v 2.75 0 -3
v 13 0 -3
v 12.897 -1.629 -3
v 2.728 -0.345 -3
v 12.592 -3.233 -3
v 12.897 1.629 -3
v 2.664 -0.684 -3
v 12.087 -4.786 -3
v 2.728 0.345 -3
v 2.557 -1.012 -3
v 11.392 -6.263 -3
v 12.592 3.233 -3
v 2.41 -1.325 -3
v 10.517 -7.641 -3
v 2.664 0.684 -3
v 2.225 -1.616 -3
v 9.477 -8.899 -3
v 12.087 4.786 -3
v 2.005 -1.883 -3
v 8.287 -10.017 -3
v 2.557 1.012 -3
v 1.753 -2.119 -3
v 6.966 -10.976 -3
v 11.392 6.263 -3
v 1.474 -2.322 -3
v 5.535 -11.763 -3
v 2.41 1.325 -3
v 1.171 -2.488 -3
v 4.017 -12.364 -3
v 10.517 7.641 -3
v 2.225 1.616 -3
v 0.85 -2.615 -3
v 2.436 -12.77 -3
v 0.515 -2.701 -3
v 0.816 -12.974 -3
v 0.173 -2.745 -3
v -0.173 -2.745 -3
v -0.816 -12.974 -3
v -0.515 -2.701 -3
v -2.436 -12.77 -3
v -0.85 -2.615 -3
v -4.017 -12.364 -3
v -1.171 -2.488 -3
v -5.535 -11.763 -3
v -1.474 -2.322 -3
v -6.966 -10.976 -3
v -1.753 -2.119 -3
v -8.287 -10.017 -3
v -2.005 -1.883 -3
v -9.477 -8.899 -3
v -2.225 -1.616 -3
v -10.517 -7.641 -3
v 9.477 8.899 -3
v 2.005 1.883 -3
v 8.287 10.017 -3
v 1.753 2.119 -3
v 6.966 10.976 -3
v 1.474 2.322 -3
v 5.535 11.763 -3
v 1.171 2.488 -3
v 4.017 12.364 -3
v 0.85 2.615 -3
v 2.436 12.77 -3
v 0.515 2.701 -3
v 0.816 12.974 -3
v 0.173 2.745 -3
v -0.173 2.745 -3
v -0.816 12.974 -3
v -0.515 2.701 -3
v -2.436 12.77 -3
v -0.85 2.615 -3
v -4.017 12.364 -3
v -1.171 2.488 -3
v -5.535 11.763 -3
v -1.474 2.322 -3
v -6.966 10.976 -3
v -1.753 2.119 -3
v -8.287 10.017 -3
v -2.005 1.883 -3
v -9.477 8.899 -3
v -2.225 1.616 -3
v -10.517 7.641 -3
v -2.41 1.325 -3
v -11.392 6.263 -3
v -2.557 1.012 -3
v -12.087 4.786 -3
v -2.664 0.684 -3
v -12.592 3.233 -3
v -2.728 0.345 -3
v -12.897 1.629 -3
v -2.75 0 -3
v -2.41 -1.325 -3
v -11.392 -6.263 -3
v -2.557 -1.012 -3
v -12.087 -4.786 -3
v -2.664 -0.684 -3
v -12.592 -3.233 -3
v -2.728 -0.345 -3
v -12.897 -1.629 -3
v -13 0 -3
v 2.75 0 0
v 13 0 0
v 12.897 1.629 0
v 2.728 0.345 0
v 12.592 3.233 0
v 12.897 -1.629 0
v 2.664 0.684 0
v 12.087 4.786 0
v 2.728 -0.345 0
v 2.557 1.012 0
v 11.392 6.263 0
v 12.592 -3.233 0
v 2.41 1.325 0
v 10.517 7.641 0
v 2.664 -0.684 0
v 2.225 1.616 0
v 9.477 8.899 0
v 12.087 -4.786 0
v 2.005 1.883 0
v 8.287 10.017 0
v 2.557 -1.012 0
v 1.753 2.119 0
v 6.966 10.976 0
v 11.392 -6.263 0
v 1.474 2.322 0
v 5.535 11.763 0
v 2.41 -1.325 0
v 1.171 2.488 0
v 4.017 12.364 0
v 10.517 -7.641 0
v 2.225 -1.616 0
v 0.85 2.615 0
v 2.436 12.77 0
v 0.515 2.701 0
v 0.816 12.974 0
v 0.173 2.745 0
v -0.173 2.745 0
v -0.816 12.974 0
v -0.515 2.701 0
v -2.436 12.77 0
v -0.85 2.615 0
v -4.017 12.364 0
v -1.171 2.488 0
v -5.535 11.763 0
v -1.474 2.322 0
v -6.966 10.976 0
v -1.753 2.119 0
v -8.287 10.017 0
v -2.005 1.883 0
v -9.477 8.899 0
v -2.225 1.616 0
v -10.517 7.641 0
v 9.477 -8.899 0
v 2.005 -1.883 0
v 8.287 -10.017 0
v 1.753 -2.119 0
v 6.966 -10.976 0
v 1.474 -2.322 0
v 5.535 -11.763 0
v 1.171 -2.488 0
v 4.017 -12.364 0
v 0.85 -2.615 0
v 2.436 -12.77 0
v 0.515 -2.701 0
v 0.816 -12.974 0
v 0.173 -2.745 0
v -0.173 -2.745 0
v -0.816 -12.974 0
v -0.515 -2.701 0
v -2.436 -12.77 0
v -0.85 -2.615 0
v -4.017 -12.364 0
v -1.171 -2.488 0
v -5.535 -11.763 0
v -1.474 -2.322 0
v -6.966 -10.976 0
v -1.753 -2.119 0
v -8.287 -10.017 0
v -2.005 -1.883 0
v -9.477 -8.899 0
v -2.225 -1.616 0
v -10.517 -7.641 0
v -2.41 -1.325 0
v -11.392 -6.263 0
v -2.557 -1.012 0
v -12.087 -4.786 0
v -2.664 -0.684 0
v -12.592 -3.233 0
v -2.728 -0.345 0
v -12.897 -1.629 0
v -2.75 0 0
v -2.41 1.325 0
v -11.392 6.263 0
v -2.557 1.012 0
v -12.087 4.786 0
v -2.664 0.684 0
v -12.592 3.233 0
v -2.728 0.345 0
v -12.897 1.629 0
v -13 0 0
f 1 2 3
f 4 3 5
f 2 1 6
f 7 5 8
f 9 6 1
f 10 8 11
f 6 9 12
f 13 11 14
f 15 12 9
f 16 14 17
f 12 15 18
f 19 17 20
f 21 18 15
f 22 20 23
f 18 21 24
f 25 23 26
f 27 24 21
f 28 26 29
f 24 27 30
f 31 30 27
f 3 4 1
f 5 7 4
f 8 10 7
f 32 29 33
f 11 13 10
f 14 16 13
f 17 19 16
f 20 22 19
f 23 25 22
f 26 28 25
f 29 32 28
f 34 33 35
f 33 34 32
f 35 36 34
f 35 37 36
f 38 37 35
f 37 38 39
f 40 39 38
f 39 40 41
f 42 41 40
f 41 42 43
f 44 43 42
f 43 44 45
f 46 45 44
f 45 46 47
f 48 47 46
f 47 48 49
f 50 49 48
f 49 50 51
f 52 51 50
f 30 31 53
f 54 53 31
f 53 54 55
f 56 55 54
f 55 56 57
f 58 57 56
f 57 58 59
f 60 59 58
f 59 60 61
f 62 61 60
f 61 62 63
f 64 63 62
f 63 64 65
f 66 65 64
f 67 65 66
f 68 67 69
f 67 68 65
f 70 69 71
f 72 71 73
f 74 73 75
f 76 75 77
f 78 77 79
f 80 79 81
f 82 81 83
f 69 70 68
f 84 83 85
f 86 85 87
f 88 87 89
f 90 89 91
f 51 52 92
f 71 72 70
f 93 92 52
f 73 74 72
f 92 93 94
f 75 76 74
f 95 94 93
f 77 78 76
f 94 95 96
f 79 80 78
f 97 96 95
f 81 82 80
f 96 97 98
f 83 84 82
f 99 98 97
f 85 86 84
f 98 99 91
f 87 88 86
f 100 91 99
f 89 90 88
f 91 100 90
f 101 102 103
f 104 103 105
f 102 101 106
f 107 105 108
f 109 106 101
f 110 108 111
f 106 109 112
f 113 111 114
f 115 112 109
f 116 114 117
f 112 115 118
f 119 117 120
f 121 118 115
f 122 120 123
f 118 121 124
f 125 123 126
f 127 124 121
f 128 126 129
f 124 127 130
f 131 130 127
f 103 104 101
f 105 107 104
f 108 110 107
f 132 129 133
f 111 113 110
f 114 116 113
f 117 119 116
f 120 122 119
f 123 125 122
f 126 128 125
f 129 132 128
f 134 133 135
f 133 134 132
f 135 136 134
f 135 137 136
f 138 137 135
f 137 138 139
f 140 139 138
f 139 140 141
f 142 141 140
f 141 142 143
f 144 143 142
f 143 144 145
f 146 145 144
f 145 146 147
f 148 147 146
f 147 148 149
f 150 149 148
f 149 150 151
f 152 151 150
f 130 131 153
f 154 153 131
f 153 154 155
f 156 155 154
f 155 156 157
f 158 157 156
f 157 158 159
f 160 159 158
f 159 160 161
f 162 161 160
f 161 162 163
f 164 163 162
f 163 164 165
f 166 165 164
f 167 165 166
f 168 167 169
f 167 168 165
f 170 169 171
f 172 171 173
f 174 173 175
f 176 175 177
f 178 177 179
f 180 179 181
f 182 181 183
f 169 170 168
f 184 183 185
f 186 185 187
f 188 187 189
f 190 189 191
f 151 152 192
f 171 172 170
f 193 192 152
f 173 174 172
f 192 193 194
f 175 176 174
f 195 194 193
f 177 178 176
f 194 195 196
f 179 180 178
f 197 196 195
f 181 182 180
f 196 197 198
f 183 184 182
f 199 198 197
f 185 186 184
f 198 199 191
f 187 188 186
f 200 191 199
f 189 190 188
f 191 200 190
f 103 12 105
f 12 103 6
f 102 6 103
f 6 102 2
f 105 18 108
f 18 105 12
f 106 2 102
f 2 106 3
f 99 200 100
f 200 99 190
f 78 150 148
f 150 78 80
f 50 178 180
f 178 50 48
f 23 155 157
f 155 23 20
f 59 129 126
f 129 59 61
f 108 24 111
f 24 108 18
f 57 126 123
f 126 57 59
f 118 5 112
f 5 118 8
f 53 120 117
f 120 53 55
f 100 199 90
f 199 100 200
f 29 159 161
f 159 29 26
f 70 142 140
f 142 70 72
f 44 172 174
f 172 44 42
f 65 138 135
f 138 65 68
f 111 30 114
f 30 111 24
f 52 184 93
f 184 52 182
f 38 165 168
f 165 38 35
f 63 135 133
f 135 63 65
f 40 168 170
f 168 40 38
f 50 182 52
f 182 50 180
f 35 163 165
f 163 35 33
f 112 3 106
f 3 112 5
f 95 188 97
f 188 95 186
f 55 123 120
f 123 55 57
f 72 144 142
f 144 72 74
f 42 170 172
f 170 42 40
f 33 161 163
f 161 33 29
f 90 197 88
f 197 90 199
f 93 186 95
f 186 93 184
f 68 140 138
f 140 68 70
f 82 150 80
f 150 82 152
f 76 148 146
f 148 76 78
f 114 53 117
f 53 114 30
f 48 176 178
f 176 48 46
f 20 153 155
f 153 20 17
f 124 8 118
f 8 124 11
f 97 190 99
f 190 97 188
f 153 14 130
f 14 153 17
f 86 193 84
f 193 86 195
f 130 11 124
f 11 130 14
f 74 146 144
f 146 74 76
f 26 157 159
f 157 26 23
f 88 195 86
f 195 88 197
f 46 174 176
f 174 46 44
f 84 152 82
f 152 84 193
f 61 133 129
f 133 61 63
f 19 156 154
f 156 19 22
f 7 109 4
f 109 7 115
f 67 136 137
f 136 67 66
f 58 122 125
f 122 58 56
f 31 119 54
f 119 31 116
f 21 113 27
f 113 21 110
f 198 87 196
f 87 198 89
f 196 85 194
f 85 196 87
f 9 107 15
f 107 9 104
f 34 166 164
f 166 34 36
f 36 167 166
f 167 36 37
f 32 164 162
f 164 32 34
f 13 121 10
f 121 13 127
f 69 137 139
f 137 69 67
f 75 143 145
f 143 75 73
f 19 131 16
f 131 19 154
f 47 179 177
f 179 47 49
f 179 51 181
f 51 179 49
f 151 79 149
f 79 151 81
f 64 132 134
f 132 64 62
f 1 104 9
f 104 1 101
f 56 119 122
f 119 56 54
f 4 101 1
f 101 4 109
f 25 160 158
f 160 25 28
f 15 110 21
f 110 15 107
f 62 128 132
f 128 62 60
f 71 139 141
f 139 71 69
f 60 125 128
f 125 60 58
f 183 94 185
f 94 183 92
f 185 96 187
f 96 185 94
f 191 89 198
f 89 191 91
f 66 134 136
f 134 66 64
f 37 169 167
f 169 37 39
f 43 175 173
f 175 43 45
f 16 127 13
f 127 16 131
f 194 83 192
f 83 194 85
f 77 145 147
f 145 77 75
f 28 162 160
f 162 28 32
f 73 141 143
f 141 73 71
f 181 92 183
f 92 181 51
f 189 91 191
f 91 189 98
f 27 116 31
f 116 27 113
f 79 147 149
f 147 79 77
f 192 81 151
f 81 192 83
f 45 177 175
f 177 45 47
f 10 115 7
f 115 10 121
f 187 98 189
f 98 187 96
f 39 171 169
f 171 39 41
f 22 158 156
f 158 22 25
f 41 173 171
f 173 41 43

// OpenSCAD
$fn = 50;


difference() {
	union() {
		translate(v = [0, 0, -3.0000000000]) {
			cylinder(h = 3, r = 10.0000000000);
		}
		translate(v = [0, 0, -3.0000000000]) {
			cylinder(h = 3, r = 13.0000000000);
		}
	}
	union() {
		#translate(v = [0, 0, -3]) {
			cylinder(h = 3, r = 2.7500000000);
		}
	}
}
